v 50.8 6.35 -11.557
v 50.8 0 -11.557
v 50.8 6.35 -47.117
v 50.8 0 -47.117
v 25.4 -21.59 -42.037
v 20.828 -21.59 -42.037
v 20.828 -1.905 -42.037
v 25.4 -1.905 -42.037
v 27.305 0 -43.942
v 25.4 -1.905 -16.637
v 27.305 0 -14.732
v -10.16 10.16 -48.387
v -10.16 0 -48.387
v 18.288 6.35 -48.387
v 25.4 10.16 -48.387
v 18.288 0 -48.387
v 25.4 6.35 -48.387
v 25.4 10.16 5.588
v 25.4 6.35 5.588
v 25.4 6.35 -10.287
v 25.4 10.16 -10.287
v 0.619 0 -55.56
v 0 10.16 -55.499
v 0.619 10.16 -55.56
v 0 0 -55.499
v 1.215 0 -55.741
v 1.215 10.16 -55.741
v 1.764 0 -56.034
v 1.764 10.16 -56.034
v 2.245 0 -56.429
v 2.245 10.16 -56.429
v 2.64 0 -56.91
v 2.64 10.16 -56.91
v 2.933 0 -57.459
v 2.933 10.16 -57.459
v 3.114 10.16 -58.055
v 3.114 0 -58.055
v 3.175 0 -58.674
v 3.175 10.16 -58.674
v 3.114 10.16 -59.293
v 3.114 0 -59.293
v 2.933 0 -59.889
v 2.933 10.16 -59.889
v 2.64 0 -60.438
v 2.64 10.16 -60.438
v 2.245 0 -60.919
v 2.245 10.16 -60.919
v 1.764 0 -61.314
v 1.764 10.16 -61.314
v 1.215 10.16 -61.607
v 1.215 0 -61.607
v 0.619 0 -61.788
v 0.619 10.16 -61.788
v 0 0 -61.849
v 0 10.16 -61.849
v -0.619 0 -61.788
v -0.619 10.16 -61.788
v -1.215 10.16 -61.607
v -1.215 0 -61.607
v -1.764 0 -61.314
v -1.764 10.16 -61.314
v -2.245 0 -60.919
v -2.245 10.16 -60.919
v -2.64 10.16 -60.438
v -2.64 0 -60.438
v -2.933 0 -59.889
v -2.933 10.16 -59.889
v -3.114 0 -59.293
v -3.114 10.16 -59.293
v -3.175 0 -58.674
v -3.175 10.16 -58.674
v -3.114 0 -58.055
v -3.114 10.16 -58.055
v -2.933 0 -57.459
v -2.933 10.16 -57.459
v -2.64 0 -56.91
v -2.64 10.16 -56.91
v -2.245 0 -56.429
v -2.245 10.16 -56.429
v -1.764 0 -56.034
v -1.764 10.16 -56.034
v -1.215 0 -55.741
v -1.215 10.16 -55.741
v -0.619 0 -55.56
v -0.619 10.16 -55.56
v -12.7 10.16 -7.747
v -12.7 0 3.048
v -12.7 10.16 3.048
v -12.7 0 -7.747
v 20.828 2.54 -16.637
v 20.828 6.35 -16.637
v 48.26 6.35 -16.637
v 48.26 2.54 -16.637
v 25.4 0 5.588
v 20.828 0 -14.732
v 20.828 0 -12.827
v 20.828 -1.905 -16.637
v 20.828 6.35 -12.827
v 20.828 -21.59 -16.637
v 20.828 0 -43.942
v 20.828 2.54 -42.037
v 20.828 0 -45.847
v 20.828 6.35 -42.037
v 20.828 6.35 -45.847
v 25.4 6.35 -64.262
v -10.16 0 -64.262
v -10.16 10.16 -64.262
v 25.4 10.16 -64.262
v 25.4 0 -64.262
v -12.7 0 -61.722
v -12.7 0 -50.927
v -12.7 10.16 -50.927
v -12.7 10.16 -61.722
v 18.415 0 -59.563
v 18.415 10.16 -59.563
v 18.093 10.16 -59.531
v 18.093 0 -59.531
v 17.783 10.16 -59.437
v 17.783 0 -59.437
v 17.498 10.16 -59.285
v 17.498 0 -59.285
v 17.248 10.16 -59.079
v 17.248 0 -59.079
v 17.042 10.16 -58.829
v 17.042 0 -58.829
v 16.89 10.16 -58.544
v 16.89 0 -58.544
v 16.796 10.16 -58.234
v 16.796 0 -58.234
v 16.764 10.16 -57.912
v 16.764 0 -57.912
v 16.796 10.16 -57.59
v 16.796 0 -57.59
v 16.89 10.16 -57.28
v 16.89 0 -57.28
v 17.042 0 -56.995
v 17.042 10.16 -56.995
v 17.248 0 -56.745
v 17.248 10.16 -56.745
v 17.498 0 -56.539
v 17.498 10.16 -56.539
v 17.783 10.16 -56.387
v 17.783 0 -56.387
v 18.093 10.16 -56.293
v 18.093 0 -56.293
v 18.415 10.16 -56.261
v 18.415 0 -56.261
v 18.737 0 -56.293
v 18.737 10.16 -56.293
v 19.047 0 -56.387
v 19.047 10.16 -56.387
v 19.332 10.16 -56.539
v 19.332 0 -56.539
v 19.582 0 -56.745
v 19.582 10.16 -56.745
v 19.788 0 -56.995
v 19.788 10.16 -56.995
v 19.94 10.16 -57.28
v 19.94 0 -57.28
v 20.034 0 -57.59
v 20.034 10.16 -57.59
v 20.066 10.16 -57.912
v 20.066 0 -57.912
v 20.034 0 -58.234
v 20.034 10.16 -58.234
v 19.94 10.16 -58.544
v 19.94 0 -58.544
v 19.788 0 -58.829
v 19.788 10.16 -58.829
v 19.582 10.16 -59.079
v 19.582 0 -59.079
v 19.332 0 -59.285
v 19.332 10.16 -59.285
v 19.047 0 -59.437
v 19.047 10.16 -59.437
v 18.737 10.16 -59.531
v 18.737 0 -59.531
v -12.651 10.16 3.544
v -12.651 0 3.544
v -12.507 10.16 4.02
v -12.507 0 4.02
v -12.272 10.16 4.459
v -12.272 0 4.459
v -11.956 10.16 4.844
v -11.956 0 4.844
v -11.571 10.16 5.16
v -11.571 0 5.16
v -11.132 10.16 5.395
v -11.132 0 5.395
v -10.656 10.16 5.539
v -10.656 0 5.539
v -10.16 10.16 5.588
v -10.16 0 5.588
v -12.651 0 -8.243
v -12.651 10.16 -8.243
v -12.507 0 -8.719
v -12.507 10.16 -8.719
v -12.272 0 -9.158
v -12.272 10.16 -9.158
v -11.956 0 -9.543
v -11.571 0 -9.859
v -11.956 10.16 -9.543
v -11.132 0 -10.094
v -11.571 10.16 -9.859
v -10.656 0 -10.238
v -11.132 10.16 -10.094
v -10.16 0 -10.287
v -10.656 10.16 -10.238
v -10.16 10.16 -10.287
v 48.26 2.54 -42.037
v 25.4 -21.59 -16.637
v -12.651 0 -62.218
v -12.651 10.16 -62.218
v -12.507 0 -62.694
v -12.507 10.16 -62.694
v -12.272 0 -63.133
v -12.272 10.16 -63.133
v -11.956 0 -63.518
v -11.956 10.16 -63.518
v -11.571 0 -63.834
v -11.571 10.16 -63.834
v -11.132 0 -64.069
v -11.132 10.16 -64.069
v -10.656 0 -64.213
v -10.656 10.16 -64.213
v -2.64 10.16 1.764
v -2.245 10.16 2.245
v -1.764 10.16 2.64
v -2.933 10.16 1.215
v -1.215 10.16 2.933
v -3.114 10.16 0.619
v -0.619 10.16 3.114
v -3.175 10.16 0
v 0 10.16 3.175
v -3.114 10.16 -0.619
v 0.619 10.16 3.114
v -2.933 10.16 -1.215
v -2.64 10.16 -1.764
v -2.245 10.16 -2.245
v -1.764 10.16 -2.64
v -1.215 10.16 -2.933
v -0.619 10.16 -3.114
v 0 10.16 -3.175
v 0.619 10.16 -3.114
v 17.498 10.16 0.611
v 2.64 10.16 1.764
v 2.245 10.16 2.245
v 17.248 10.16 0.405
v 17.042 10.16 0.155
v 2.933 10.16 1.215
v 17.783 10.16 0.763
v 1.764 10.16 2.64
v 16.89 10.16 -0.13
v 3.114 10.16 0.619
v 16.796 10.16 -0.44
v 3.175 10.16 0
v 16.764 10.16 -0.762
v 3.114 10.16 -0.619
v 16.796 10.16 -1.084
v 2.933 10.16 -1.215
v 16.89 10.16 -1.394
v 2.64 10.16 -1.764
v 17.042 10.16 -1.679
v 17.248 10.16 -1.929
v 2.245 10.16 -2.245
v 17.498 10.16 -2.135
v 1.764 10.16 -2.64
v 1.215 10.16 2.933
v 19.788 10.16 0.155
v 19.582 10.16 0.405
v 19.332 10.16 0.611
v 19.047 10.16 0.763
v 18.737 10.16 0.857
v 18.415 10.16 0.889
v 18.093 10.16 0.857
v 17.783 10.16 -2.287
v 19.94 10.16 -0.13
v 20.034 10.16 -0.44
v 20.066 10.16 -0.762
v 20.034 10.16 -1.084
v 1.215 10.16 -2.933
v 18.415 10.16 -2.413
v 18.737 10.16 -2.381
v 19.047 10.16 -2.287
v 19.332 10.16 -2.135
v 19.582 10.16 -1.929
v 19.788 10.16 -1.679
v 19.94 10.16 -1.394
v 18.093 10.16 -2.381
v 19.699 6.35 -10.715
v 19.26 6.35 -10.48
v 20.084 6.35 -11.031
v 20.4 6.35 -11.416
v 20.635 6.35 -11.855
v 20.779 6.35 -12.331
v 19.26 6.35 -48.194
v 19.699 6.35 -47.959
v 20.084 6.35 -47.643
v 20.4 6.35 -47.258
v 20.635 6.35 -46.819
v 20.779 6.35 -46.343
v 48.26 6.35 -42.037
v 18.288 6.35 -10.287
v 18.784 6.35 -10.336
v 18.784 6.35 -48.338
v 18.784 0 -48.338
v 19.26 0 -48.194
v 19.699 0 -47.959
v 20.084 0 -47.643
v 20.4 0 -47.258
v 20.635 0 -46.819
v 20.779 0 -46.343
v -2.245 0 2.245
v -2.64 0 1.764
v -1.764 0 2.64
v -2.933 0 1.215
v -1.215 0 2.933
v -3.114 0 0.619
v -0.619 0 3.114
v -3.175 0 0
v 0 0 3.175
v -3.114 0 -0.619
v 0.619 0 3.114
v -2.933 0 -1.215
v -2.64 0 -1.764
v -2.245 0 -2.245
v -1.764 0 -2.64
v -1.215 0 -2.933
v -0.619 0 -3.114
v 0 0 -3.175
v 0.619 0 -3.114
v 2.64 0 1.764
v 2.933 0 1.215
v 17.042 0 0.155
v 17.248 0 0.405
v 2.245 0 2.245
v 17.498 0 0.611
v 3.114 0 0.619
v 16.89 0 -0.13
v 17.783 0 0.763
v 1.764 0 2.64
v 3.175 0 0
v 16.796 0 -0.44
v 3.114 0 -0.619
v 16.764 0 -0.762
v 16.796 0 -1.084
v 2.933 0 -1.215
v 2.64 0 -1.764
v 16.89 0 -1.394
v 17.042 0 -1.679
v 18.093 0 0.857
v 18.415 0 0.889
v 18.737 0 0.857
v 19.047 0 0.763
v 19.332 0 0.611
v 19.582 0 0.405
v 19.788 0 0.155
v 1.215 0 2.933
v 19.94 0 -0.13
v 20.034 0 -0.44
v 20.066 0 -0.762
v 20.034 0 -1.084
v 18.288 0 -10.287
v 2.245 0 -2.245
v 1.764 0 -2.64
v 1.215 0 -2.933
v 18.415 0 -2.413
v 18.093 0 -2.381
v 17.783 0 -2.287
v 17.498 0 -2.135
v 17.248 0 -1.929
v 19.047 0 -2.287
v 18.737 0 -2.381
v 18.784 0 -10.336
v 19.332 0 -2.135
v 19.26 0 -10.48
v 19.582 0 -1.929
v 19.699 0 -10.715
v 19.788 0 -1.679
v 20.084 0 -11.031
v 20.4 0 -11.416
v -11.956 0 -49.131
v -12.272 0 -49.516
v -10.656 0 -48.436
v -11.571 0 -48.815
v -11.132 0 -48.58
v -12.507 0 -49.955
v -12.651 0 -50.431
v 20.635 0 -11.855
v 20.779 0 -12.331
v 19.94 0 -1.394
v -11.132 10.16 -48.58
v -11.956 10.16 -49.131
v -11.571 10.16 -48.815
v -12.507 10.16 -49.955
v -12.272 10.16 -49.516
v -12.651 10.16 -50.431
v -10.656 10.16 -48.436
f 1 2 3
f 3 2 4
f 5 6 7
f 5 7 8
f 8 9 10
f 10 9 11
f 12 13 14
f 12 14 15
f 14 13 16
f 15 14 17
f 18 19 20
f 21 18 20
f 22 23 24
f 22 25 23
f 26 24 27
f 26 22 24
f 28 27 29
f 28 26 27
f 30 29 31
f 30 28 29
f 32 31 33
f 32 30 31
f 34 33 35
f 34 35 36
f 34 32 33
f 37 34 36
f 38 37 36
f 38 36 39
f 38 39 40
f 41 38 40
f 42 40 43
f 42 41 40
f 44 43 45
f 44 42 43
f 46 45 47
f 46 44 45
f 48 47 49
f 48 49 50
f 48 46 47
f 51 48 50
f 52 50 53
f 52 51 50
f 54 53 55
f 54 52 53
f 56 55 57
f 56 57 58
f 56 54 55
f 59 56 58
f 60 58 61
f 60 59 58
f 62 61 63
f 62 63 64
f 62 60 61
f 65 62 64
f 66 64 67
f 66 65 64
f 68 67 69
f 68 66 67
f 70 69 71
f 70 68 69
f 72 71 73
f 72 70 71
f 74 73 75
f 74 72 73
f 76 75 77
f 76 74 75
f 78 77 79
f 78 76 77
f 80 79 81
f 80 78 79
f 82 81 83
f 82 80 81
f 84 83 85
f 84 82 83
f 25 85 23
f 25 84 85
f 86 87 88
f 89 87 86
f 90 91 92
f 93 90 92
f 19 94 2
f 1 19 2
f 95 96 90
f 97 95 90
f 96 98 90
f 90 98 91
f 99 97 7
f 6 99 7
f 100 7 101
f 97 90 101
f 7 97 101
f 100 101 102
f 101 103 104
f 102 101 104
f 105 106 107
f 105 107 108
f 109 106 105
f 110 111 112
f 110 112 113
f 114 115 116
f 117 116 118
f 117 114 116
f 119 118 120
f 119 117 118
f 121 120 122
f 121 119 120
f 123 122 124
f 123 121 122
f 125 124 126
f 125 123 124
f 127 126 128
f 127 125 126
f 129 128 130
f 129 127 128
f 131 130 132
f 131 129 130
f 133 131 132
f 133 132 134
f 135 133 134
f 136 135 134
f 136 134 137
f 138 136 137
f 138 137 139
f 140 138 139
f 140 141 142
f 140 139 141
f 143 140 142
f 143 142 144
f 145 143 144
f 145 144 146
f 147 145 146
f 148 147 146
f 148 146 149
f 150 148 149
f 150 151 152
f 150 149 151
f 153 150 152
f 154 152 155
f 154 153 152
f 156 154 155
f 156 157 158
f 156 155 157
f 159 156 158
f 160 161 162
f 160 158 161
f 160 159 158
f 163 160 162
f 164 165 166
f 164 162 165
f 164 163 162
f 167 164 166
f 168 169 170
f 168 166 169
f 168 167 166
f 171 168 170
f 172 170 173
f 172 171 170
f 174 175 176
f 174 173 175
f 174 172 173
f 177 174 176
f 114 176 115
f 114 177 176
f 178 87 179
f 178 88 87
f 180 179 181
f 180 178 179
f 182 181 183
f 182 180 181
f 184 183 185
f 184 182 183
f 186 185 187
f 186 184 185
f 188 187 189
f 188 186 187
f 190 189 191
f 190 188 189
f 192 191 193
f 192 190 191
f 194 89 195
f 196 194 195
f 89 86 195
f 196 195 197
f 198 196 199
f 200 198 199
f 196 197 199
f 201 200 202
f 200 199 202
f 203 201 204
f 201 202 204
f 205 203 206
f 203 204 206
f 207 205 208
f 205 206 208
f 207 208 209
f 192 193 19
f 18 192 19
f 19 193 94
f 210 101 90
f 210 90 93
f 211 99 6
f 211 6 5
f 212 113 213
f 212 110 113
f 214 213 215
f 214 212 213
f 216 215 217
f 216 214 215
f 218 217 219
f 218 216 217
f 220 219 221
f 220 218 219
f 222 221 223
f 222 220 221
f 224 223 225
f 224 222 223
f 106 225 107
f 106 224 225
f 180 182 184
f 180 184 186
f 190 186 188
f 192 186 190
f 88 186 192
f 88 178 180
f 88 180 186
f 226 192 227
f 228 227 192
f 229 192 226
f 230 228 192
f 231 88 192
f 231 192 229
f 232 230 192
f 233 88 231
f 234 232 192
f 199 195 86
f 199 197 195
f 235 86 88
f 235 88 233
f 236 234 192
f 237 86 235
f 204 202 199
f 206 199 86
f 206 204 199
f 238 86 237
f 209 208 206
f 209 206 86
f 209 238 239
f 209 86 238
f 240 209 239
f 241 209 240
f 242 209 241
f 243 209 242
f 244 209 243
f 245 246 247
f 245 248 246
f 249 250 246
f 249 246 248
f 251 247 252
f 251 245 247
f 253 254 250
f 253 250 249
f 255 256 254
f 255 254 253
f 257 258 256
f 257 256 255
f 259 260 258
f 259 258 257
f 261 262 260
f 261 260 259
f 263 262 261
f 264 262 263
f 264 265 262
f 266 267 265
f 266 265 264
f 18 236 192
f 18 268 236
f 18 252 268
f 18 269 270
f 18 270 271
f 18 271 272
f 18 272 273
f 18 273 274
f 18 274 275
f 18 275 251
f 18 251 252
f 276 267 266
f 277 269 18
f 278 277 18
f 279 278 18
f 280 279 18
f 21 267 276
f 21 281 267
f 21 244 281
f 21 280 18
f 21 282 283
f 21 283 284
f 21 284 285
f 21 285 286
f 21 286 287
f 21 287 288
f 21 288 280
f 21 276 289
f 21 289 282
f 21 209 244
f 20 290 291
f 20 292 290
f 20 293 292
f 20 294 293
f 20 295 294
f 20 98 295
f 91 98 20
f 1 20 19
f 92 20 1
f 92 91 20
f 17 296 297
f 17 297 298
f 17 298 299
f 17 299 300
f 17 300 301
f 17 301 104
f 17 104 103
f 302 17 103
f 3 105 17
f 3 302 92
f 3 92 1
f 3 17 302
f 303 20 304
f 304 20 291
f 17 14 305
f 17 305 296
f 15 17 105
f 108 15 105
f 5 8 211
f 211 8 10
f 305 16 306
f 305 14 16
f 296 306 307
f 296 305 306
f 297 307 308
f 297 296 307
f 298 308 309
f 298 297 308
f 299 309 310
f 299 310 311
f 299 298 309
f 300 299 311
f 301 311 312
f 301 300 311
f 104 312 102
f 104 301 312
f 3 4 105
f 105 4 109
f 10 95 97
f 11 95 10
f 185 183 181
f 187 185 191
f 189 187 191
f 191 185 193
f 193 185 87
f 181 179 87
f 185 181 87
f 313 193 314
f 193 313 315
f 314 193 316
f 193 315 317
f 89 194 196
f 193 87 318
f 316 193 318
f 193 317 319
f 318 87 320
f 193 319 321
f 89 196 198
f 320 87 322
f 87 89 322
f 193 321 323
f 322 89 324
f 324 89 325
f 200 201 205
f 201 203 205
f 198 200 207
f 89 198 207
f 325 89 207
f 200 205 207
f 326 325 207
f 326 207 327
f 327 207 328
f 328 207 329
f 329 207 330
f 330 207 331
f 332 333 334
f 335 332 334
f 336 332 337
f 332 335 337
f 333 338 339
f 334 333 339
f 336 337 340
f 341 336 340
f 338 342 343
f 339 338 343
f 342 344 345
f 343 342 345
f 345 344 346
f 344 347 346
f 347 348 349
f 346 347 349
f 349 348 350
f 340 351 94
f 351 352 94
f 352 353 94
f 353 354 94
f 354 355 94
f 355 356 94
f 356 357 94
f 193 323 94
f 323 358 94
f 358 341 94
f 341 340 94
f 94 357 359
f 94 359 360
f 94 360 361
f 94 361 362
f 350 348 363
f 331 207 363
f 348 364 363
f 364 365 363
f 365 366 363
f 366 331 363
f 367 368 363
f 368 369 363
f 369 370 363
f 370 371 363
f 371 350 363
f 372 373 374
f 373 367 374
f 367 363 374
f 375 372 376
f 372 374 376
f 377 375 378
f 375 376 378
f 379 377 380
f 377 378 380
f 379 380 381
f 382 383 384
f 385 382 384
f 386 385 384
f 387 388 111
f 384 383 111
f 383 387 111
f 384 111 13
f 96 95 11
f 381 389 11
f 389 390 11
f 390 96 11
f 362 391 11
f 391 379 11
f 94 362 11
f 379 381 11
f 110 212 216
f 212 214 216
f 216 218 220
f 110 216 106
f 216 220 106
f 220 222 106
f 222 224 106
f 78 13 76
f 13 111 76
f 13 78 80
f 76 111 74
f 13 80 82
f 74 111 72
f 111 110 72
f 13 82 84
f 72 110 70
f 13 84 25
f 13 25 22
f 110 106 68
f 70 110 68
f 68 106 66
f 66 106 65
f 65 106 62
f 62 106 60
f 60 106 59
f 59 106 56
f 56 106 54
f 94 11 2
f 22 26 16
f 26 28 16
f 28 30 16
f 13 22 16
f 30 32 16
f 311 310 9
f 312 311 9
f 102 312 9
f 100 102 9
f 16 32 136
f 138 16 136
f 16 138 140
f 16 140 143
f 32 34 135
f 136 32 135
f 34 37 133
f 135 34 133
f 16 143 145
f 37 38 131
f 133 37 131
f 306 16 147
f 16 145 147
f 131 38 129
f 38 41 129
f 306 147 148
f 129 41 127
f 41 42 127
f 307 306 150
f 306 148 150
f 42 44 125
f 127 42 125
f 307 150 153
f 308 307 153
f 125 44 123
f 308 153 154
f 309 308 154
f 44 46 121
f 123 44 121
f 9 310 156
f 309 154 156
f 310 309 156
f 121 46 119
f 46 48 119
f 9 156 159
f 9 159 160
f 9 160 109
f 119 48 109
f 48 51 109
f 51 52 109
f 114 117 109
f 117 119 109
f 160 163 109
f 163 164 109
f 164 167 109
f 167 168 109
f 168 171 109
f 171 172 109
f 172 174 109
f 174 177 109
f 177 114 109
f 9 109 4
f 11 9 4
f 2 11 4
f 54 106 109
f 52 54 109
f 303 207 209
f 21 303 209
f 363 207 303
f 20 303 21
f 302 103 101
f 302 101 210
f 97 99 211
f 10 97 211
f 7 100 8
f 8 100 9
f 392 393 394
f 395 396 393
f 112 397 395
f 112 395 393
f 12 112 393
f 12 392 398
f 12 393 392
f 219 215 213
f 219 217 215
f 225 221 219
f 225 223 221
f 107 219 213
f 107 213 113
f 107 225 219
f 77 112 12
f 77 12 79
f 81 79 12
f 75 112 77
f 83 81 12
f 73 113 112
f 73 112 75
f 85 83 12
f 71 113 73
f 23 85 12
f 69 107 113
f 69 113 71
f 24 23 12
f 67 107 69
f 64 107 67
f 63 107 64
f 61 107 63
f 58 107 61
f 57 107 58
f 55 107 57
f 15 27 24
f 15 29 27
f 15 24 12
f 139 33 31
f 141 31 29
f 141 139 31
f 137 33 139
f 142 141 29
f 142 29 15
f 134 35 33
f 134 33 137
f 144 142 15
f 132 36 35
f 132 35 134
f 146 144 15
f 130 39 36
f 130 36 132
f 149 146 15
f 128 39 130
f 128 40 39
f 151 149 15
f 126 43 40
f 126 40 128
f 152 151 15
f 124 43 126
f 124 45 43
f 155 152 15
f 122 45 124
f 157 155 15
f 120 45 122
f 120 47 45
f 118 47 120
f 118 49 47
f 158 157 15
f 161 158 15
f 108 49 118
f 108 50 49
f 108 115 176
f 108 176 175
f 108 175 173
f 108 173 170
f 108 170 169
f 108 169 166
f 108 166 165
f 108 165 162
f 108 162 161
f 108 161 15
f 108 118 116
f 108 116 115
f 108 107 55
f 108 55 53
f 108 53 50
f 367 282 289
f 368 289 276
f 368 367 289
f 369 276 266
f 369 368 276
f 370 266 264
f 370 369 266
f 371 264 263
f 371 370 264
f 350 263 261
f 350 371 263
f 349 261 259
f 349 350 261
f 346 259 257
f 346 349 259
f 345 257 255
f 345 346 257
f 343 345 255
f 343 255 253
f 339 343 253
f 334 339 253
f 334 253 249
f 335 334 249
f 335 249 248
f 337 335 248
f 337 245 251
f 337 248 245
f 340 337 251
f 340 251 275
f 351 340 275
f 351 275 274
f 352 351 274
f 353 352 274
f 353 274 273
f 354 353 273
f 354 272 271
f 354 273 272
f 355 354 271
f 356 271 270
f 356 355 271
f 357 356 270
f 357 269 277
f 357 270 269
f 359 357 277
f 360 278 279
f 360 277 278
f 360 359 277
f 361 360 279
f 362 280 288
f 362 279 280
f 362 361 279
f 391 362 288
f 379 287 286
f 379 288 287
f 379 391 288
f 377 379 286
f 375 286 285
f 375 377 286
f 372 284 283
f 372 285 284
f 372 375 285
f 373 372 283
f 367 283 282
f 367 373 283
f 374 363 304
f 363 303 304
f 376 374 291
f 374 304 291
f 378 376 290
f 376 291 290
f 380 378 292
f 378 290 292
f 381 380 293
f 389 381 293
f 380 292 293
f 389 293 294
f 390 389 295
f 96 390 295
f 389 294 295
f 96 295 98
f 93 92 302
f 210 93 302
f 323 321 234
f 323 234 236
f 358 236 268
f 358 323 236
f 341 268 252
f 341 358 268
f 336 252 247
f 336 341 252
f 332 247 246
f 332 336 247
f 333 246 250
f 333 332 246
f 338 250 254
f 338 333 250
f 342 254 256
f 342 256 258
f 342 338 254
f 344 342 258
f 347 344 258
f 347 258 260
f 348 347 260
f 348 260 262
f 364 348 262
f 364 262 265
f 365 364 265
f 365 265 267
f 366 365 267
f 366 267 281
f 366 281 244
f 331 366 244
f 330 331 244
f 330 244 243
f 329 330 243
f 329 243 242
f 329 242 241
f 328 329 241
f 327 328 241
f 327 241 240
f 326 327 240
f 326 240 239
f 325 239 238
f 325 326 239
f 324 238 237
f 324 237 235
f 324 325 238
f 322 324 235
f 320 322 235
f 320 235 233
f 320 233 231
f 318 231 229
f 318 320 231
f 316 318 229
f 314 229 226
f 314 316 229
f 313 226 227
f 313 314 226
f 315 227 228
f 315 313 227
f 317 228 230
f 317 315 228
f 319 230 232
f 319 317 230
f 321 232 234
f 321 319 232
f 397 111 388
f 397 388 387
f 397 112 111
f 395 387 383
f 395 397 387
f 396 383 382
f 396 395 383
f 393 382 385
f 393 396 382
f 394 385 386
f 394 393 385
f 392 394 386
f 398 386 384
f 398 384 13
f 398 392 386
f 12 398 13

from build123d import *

# Parameters (mm, degrees)
SKETCH1_W                = 38.1
SKETCH1_H                = 69.85
SKETCH1_R                = 3.175
SKETCH1_W_2              = 25.4
SKETCH1_H_2              = 35.56
BOSS_EXTRUDE1_DEPTH      = 6.35
SKETCH2_W                = 27.432
SKETCH2_H                = 25.4
CUT_EXTRUDE1_DEPTH       = 3.81
SKETCH3_W                = 33.528
SKETCH3_H                = 38.1
CUT_EXTRUDE2_DEPTH       = 83.161835082
SKETCH9_W                = 4.572
SKETCH9_H                = 25.4
BOSS_EXTRUDE5_DEPTH      = 21.59
BOSS_EXTRUDE6_DEPTH      = 3.81
BOSS_EXTRUDE6_DEPTH_BACK = 0.000254
SKETCH10_W               = 38.1
SKETCH10_H               = 15.875
SKETCH10_R               = 3.175
CUT_EXTRUDE4_DEPTH       = 88.853896578
CUT_EXTRUDE4_DEPTH_BACK  = 10.16
SKETCH11_R               = 1.651
FILLET4_R                = 2.54
CHAMFER3_SIZE            = 1.905


with BuildPart() as part:
    # Sketch1 → Boss-Extrude1 (new body)
    # profile 1 of 4: a face of its own
    with BuildSketch(Plane(origin=(0, 0, 0), x_dir=(1, 0, 0), z_dir=(0, 1, 0))):
        with Locations((6.35, 29.337)):
            Rectangle(SKETCH1_W, SKETCH1_H)
        with Locations(Location((0, 58.674, 0), (0, 0, 270))):
            Circle(SKETCH1_R, mode=Mode.SUBTRACT)
        with Locations(Location((0, 0, 0), (0, 0, 270))):
            Circle(SKETCH1_R, mode=Mode.SUBTRACT)
    # profile 2 of 4: a face of its own
    with BuildSketch(Plane(origin=(0, 0, 0), x_dir=(1, 0, 0), z_dir=(0, 1, 0))):
        Polygon((25.4, 47.117), (50.8, 47.117), (25.4, 64.262), align=None)
    # profile 3 of 4: a face of its own
    with BuildSketch(Plane(origin=(0, 0, 0), x_dir=(1, 0, 0), z_dir=(0, 1, 0))):
        with Locations((38.1, 29.337)):
            Rectangle(SKETCH1_W_2, SKETCH1_H_2)
    # profile 4 of 4: a face of its own
    with BuildSketch(Plane(origin=(0, 0, 0), x_dir=(1, 0, 0), z_dir=(0, 1, 0))):
        Polygon((25.4, -5.588), (50.8, 11.557), (25.4, 11.557), align=None)
    extrude(amount=BOSS_EXTRUDE1_DEPTH)

    # Sketch2 → Cut-Extrude1 (cut)
    with BuildSketch(Plane(origin=(0, 6.35, 0), x_dir=(1, 0, 0), z_dir=(0, 1, 0))):
        with Locations((34.544, 29.337)):
            Rectangle(SKETCH2_W, SKETCH2_H)
    extrude(amount=-CUT_EXTRUDE1_DEPTH, mode=Mode.SUBTRACT)

    # Sketch3 → Cut-Extrude2 (cut, through all)
    with BuildSketch(Plane(origin=(0, 6.35, 0), x_dir=(1, 0, 0), z_dir=(0, 1, 0))):
        with Locations((4.064, 29.337)):
            Rectangle(SKETCH3_W, SKETCH3_H)
    extrude(amount=-CUT_EXTRUDE2_DEPTH, mode=Mode.SUBTRACT)

    # Sketch9 → Boss-Extrude5 (add)
    with BuildSketch(Plane.XZ):
        with Locations((23.114, -29.337)):
            Rectangle(SKETCH9_W, SKETCH9_H)
    extrude(amount=BOSS_EXTRUDE5_DEPTH)

    # Sketch10 → Boss-Extrude6 (add, two sides: drawn at the far end of the back side and taken through both)
    # profile 1 of 2: a face of its own
    with BuildSketch(Plane(origin=(0, 6.35, 0), x_dir=(1, 0, 0), z_dir=(0, 1, 0)).offset(-BOSS_EXTRUDE6_DEPTH_BACK)):
        with Locations((6.35, 56.3245)):
            Rectangle(SKETCH10_W, SKETCH10_H)
        with Locations(Location((0, 58.674, 0), (0, 0, 270))):
            Circle(SKETCH10_R, mode=Mode.SUBTRACT)
    # profile 2 of 2: a face of its own
    with BuildSketch(Plane(origin=(0, 6.35, 0), x_dir=(1, 0, 0), z_dir=(0, 1, 0)).offset(-BOSS_EXTRUDE6_DEPTH_BACK)):
        with Locations((6.35, 2.3495)):
            Rectangle(SKETCH10_W, SKETCH10_H)
        with Locations(Location((0, 0, 0), (0, 0, 270))):
            Circle(SKETCH10_R, mode=Mode.SUBTRACT)
    extrude(amount=BOSS_EXTRUDE6_DEPTH + BOSS_EXTRUDE6_DEPTH_BACK)

    # Sketch11 → Cut-Extrude4 (cut, two sides: drawn at the far end of the back side and taken through both)
    with BuildSketch(Plane(origin=(0, 10.16, 0), x_dir=(1, 0, 0), z_dir=(0, 1, 0)).offset(-CUT_EXTRUDE4_DEPTH_BACK)):
        with Locations(Location((18.415, 57.912, 0), (0, 0, 90))):
            Circle(SKETCH11_R)
        with Locations(Location((18.415, 0.762, 0), (0, 0, 90))):
            Circle(SKETCH11_R)
    extrude(amount=CUT_EXTRUDE4_DEPTH + CUT_EXTRUDE4_DEPTH_BACK, mode=Mode.SUBTRACT)

    # Fillet4
    fillet4_edges = [part.edges().sort_by_distance(p)[0] for p in [
        (-12.7, 5.08, 5.588),
        (-12.7, 5.08, -64.262),
        (20.828, 3.175, -48.387),
        (-12.7, 5.08, -10.287),
        (-12.7, 5.08, -48.387),
        (20.828, 3.175, -10.287),
    ]]
    fillet(fillet4_edges, radius=FILLET4_R)

    # Chamfer3
    chamfer3_edges = [part.edges().sort_by_distance(p)[0] for p in [
        (23.114, 0, -42.037),
        (25.4, 0, -29.337),
        (23.114, 0, -16.637),
    ]]
    chamfer(chamfer3_edges, length=CHAMFER3_SIZE)


solid = part.part
